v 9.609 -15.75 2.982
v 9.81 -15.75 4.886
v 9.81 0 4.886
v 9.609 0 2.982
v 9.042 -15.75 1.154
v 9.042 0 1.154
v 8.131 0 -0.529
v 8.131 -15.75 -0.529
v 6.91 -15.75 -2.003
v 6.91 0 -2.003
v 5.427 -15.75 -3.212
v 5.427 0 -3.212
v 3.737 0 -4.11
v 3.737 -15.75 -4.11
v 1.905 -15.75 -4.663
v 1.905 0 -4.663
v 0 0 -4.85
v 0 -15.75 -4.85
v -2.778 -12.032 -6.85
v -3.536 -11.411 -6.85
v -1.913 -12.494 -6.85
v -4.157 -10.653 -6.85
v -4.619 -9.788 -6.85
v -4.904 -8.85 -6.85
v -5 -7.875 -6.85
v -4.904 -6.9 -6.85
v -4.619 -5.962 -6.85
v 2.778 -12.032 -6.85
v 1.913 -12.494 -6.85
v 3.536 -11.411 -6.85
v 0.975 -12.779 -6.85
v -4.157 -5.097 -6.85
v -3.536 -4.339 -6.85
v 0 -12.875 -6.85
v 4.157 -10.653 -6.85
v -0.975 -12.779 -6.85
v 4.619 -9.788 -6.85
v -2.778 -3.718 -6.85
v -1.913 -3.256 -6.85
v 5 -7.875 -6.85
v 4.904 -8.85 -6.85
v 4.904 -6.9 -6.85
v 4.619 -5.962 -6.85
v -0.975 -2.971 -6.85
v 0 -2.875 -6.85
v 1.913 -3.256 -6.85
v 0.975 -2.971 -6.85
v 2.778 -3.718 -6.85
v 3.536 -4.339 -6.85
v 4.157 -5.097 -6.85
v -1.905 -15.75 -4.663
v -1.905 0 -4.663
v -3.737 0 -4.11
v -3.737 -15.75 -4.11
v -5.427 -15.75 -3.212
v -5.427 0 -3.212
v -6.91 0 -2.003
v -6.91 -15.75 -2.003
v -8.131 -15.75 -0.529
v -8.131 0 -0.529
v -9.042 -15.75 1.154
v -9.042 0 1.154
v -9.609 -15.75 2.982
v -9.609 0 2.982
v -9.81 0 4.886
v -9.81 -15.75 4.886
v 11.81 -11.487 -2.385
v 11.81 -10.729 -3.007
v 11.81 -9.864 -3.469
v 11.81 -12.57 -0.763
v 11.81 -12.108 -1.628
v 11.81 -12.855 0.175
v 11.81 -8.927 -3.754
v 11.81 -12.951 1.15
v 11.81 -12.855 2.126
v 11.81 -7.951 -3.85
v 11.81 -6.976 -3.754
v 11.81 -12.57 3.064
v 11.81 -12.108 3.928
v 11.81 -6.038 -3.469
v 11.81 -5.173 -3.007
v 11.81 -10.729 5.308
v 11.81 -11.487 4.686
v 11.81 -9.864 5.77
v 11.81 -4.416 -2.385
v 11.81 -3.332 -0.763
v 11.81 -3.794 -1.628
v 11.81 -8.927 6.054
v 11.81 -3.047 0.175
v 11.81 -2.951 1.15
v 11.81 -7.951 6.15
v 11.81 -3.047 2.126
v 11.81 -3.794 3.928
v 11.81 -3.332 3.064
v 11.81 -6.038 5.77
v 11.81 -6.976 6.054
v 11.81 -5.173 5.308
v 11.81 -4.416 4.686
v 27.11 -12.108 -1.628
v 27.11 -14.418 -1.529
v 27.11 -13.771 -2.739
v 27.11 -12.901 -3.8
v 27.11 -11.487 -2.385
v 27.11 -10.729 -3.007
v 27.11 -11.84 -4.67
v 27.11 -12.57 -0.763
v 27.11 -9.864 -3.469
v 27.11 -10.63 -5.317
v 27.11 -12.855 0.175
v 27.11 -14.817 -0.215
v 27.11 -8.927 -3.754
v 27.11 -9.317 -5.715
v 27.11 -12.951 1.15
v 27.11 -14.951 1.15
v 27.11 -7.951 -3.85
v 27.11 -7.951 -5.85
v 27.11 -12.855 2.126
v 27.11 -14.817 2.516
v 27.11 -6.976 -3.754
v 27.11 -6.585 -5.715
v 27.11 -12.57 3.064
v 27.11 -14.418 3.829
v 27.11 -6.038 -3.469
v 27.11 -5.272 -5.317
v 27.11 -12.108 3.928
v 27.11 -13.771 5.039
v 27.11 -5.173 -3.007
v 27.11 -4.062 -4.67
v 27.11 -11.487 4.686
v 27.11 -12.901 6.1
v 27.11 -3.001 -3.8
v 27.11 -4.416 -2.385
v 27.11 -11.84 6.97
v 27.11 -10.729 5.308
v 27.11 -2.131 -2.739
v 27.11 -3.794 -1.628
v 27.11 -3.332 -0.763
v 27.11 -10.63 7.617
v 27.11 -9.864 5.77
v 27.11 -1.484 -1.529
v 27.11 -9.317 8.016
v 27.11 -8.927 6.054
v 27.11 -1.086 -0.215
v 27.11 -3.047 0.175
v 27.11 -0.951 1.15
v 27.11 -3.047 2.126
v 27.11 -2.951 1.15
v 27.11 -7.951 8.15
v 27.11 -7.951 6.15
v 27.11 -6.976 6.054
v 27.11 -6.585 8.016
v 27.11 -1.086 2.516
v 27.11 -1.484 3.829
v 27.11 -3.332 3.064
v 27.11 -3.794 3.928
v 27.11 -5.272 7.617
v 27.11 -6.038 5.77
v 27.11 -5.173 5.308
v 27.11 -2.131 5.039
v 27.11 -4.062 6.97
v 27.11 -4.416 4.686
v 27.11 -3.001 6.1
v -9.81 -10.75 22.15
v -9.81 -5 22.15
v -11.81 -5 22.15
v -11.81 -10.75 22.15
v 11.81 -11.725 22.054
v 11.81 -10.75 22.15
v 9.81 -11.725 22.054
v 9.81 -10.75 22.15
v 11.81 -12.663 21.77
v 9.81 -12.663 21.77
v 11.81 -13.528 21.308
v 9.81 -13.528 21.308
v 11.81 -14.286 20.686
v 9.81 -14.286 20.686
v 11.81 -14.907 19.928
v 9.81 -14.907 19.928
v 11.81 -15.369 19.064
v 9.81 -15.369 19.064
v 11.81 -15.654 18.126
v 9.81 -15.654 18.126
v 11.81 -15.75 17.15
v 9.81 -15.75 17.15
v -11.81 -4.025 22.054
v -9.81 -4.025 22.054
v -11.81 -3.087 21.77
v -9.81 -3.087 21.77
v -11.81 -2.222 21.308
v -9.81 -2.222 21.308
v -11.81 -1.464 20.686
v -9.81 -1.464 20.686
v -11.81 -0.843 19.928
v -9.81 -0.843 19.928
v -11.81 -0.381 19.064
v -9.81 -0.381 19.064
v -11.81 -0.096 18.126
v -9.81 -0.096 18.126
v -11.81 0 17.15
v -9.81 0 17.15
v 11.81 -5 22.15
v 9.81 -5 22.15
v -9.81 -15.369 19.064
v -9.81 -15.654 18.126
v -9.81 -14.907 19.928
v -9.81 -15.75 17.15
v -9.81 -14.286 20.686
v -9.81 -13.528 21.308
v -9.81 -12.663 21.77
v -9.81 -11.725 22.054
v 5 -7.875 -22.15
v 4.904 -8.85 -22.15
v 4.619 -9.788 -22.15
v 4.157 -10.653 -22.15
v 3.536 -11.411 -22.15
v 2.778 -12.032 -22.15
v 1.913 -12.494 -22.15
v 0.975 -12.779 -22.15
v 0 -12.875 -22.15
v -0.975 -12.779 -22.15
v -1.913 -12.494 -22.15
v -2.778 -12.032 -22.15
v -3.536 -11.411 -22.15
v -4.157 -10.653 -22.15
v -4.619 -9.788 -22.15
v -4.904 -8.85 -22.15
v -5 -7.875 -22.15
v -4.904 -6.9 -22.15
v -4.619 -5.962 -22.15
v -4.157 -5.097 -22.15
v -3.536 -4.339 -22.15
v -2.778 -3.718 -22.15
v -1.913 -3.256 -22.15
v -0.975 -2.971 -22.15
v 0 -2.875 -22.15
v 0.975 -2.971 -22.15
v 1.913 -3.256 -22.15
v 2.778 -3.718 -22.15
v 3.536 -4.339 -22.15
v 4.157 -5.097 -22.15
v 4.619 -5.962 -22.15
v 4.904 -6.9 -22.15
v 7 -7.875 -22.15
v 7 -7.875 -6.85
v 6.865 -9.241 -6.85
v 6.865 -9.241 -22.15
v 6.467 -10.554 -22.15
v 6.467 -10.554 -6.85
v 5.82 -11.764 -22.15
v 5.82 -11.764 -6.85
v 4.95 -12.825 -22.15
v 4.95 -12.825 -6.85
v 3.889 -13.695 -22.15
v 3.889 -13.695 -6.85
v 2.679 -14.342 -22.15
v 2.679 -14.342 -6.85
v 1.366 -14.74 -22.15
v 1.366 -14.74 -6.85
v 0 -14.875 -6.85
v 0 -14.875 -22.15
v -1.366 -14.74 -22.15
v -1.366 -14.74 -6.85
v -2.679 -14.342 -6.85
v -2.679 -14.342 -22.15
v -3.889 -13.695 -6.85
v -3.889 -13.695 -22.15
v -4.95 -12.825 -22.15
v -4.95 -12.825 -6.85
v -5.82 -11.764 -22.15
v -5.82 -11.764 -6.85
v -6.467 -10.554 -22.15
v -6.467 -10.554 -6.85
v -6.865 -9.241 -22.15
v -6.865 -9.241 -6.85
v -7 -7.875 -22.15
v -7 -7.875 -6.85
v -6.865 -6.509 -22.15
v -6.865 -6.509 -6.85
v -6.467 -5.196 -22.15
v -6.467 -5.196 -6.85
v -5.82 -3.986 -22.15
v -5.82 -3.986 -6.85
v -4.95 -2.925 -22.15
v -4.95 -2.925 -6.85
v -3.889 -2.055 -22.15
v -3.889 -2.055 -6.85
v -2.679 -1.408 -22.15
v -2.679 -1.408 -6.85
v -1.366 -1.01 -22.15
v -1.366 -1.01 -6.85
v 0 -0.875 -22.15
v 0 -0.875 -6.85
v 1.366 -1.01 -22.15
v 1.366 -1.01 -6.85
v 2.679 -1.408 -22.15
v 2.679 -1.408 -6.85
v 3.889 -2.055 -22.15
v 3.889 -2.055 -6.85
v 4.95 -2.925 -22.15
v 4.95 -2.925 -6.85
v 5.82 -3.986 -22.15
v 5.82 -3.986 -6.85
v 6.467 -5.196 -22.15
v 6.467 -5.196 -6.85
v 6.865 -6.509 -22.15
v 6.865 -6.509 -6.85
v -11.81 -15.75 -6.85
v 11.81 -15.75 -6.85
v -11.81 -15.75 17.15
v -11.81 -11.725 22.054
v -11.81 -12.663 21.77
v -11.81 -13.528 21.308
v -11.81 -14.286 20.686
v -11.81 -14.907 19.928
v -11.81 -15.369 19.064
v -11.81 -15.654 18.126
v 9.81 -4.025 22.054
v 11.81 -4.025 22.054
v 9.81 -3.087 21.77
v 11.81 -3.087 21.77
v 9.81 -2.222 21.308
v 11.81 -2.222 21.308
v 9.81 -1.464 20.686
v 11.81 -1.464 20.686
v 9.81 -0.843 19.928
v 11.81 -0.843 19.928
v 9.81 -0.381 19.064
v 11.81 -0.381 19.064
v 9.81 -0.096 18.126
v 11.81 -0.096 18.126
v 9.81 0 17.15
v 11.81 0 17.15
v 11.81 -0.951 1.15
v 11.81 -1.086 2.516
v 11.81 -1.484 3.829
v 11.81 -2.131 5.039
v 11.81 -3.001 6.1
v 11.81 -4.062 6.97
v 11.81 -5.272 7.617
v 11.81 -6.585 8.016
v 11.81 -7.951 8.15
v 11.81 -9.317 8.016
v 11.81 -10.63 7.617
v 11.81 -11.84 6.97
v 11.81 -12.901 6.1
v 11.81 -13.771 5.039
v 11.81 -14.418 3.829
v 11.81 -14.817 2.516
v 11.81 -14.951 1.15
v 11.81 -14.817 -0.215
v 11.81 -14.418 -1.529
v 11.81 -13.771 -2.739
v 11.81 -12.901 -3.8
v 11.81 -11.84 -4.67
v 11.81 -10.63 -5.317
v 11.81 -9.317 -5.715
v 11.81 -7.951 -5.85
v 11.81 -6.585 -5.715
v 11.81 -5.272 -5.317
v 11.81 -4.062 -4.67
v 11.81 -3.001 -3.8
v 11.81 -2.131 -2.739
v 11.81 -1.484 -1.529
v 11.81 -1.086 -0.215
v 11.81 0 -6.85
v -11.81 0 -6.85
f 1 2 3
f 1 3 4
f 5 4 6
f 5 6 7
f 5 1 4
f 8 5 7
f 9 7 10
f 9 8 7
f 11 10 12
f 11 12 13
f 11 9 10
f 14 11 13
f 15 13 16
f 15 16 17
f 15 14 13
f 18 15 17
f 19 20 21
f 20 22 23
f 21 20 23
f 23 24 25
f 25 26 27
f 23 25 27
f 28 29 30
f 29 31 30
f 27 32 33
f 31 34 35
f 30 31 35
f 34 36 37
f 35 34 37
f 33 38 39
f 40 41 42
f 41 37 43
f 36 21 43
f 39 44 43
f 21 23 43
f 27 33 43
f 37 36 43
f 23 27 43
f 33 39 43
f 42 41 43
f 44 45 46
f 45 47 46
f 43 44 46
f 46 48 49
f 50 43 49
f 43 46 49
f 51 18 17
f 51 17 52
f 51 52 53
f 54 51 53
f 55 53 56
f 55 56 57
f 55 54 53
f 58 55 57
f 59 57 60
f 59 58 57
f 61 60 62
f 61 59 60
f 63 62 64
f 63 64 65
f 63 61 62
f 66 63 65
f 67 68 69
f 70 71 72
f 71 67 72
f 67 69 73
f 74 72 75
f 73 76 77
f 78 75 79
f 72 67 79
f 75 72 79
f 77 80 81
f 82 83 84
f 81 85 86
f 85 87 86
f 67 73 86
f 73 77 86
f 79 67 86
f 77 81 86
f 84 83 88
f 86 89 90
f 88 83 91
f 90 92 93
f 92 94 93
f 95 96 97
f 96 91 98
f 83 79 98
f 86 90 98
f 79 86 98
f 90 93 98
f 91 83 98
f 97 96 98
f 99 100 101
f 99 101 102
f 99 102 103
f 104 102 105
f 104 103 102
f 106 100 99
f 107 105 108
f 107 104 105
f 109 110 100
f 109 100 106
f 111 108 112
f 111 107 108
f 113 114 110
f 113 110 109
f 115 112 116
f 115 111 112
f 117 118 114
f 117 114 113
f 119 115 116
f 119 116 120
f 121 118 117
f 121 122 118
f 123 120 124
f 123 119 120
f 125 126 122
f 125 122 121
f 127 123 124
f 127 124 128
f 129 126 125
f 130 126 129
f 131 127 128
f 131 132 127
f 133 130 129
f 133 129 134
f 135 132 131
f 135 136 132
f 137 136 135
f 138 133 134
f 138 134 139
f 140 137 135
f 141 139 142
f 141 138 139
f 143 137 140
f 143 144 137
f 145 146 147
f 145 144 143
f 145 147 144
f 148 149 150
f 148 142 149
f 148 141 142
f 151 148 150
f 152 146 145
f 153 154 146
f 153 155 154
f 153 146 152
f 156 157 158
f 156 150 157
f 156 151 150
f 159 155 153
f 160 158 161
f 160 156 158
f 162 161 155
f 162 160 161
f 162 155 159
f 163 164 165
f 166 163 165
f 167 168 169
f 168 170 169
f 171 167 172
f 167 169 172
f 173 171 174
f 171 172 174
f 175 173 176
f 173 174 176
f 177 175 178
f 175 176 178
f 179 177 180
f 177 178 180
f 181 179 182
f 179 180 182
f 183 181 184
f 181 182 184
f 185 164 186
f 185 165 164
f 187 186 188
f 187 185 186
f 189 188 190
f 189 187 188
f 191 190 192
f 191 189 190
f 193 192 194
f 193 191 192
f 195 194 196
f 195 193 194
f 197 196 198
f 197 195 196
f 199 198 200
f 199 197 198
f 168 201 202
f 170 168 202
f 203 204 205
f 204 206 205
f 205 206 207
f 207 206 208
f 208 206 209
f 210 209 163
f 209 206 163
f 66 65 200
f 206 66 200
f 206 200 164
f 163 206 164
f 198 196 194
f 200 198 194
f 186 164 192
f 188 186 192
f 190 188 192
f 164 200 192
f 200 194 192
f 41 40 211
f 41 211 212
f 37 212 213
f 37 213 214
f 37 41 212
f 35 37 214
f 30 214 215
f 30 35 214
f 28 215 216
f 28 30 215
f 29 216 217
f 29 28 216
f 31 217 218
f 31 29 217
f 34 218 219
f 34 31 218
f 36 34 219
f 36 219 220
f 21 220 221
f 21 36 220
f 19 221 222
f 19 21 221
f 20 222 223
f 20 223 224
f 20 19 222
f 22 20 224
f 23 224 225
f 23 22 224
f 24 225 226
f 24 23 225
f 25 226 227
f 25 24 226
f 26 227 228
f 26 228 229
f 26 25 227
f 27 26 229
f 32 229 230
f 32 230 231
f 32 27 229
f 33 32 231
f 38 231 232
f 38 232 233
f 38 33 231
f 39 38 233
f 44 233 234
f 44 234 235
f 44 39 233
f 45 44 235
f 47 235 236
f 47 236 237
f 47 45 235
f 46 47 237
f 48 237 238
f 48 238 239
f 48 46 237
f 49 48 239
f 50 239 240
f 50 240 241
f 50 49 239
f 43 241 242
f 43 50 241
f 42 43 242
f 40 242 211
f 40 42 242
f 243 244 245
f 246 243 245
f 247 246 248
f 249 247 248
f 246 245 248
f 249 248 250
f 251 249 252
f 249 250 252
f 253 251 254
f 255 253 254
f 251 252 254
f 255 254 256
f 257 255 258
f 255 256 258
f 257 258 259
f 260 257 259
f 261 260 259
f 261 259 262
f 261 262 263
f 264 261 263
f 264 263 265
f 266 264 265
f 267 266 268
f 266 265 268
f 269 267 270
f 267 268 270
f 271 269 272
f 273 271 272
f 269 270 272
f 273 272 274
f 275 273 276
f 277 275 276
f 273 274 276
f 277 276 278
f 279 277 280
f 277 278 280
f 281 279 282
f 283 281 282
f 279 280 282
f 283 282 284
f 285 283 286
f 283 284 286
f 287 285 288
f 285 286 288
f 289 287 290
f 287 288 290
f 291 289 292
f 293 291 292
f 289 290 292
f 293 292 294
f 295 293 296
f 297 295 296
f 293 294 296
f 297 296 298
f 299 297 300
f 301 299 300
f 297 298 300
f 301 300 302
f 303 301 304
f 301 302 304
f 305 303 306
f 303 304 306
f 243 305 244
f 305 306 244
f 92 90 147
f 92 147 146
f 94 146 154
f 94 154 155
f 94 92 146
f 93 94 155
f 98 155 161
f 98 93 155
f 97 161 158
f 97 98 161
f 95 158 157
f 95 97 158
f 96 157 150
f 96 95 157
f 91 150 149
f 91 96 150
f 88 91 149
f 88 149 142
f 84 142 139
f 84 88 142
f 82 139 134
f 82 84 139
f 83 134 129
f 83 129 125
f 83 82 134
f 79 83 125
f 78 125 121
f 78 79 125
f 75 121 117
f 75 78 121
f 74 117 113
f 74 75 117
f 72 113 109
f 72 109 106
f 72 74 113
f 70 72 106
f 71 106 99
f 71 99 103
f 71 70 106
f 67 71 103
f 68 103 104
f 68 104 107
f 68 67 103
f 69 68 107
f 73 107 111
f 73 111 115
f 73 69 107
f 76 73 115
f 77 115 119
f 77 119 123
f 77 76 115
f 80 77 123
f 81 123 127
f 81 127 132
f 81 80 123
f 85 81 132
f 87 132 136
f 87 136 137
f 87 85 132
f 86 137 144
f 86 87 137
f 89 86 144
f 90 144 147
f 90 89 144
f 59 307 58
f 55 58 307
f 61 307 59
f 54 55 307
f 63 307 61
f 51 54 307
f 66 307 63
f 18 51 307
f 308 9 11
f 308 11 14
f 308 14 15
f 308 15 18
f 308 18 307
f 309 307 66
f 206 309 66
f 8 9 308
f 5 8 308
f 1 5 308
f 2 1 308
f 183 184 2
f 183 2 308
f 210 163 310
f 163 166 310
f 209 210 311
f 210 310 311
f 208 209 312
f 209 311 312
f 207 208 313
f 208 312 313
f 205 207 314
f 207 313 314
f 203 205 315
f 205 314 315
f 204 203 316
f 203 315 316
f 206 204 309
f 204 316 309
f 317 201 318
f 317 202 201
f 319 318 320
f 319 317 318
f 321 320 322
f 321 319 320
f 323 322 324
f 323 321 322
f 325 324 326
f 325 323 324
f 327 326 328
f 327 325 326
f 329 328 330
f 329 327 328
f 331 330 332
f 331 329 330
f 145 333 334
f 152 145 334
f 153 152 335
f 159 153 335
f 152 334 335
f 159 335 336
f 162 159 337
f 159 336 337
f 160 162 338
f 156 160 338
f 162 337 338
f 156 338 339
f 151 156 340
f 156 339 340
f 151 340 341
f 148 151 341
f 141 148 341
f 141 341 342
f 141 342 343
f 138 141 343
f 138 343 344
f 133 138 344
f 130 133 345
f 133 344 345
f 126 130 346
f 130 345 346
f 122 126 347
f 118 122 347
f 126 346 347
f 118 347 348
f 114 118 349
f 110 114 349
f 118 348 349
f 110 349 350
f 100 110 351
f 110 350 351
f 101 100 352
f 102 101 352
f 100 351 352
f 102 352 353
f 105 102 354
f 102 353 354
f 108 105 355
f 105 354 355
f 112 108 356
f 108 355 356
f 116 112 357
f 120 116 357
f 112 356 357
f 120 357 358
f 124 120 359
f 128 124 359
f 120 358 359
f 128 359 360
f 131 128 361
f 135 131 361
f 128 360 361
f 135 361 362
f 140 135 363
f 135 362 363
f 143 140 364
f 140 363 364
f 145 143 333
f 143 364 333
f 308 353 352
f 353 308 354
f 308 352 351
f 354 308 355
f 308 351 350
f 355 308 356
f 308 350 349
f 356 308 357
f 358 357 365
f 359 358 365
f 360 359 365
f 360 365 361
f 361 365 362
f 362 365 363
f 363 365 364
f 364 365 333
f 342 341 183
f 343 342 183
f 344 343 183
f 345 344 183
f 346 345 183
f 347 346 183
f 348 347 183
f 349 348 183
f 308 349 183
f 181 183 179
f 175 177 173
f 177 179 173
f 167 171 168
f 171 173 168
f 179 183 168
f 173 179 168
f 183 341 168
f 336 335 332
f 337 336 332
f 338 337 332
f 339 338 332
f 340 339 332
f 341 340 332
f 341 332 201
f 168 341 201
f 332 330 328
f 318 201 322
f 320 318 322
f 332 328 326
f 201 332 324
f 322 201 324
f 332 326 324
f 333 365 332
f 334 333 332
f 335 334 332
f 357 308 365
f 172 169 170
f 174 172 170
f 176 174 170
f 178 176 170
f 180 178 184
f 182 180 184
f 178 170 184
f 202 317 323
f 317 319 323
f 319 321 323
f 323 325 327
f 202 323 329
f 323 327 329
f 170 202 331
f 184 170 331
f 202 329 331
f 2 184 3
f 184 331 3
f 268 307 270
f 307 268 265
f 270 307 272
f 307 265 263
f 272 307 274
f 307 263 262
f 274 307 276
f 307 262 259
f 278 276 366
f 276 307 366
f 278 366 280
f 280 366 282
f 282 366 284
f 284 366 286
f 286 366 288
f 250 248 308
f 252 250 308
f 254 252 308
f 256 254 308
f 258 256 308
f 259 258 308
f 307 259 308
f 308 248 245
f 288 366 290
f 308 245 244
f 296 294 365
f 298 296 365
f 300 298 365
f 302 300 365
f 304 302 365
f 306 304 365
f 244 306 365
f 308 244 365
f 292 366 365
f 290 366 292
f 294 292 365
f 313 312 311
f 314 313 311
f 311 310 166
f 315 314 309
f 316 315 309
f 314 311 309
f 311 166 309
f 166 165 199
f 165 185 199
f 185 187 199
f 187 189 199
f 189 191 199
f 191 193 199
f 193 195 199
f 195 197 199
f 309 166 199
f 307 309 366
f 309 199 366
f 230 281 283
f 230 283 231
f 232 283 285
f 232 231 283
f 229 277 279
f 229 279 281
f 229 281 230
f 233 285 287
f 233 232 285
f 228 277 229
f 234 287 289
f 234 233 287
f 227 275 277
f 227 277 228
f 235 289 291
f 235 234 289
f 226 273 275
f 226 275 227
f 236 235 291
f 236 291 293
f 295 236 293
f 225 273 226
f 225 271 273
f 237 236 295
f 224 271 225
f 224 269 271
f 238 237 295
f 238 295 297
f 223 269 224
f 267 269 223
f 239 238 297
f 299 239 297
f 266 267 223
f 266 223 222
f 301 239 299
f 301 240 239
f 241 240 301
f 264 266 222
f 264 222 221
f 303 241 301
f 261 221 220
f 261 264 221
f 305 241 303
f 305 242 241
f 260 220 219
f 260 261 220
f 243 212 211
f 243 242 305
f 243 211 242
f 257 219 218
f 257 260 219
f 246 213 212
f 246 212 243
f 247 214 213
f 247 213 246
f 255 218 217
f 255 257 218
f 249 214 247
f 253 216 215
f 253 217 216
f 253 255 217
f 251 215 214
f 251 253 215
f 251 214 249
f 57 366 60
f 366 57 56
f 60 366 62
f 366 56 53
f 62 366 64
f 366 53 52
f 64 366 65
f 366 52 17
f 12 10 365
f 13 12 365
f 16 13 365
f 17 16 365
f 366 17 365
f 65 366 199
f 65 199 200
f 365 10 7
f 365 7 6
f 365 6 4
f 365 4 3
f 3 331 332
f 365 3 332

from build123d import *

# Parameters (mm, degrees)
F0_W     = 9.81
F0_H     = 2
F1_DEPTH = 15.75
F2_R     = 5
F3_R     = 7
F3_R_2   = 5
F4_DEPTH = 15.3
F5_R     = 7
F5_R_2   = 5
F6_DEPTH = 15.3
F8_DEPTH = 15.75


with BuildPart() as f1:
    # F0 (on Front) → F1 (new body)
    with BuildSketch(Plane.XZ):
        Polygon((-9.81, 22.150199), (-11.81, 22.150199), (-11.81, -6.849801), (-9.81, -6.849801), (-9.81, -4.849801), align=None)
        with Locations((-4.905, -5.849801)):
            Rectangle(F0_W, F0_H)
        with Locations((4.905, -5.849801)):
            Rectangle(F0_W, F0_H)
        Polygon((9.81, 22.150199), (9.81, -4.849801), (9.81, -6.849801), (11.81, -6.849801), (11.81, 22.150199), align=None)
    extrude(amount=F1_DEPTH)

    # F2
    f2_edges = [f1.edges().sort_by_distance(p)[0] for p in [
        (10.81, -15.75, 22.150199),
        (-10.81, -15.75, 22.150199),
        (10.81, 0, 22.150199),
        (-10.81, 0, 22.150199),
    ]]
    fillet(f2_edges, radius=F2_R)

    # F3 (on face) → F4 (join)
    with BuildSketch(Plane.YZ.offset(11.81)):
        with Locations((-7.951076, 1.150199)):
            Circle(F3_R)
        with Locations((-7.951076, 1.150199)):
            Circle(F3_R_2, mode=Mode.SUBTRACT)
    extrude(amount=F4_DEPTH)

    # F5 (on face) → F6 (join)
    with BuildSketch(Plane(origin=(0, 0, -6.849801), x_dir=(1, 0, 0), z_dir=(0, 0, -1))):
        with Locations((0, 7.875)):
            Circle(F5_R)
        with Locations((0, 7.875)):
            Circle(F5_R_2, mode=Mode.SUBTRACT)
    extrude(amount=F6_DEPTH)

    # F7 (on face) → F8 (join, through all)
    with BuildSketch(Plane.XZ.offset(15.75)):
        with BuildLine():
            ThreePointArc((9.81, 4.885641), (9.810285, 4.960485), (9.81, 5.035329))
            Line((9.81, 5.035329), (9.81, 4.885641))
        make_face()
        with BuildLine():
            ThreePointArc((-9.81, 5.035329), (-9.810285, 4.960485), (-9.81, 4.885641))
            Line((-9.81, 4.885641), (-9.81, 5.035329))
        make_face()
        with BuildLine():
            Line((-9.81, -4.849801), (0, -4.849801))
            ThreePointArc((0, -4.849801), (-6.910407, -2.002845), (-9.81, 4.885641))
            Line((-9.81, 4.885641), (-9.81, -4.849801))
        make_face()
        with BuildLine():
            Line((9.81, -4.849801), (9.81, 4.885641))
            ThreePointArc((9.81, 4.885641), (6.910407, -2.002846), (0, -4.849801))
            Line((0, -4.849801), (9.81, -4.849801))
        make_face()
    extrude(amount=-F8_DEPTH)


solid = f1.part
